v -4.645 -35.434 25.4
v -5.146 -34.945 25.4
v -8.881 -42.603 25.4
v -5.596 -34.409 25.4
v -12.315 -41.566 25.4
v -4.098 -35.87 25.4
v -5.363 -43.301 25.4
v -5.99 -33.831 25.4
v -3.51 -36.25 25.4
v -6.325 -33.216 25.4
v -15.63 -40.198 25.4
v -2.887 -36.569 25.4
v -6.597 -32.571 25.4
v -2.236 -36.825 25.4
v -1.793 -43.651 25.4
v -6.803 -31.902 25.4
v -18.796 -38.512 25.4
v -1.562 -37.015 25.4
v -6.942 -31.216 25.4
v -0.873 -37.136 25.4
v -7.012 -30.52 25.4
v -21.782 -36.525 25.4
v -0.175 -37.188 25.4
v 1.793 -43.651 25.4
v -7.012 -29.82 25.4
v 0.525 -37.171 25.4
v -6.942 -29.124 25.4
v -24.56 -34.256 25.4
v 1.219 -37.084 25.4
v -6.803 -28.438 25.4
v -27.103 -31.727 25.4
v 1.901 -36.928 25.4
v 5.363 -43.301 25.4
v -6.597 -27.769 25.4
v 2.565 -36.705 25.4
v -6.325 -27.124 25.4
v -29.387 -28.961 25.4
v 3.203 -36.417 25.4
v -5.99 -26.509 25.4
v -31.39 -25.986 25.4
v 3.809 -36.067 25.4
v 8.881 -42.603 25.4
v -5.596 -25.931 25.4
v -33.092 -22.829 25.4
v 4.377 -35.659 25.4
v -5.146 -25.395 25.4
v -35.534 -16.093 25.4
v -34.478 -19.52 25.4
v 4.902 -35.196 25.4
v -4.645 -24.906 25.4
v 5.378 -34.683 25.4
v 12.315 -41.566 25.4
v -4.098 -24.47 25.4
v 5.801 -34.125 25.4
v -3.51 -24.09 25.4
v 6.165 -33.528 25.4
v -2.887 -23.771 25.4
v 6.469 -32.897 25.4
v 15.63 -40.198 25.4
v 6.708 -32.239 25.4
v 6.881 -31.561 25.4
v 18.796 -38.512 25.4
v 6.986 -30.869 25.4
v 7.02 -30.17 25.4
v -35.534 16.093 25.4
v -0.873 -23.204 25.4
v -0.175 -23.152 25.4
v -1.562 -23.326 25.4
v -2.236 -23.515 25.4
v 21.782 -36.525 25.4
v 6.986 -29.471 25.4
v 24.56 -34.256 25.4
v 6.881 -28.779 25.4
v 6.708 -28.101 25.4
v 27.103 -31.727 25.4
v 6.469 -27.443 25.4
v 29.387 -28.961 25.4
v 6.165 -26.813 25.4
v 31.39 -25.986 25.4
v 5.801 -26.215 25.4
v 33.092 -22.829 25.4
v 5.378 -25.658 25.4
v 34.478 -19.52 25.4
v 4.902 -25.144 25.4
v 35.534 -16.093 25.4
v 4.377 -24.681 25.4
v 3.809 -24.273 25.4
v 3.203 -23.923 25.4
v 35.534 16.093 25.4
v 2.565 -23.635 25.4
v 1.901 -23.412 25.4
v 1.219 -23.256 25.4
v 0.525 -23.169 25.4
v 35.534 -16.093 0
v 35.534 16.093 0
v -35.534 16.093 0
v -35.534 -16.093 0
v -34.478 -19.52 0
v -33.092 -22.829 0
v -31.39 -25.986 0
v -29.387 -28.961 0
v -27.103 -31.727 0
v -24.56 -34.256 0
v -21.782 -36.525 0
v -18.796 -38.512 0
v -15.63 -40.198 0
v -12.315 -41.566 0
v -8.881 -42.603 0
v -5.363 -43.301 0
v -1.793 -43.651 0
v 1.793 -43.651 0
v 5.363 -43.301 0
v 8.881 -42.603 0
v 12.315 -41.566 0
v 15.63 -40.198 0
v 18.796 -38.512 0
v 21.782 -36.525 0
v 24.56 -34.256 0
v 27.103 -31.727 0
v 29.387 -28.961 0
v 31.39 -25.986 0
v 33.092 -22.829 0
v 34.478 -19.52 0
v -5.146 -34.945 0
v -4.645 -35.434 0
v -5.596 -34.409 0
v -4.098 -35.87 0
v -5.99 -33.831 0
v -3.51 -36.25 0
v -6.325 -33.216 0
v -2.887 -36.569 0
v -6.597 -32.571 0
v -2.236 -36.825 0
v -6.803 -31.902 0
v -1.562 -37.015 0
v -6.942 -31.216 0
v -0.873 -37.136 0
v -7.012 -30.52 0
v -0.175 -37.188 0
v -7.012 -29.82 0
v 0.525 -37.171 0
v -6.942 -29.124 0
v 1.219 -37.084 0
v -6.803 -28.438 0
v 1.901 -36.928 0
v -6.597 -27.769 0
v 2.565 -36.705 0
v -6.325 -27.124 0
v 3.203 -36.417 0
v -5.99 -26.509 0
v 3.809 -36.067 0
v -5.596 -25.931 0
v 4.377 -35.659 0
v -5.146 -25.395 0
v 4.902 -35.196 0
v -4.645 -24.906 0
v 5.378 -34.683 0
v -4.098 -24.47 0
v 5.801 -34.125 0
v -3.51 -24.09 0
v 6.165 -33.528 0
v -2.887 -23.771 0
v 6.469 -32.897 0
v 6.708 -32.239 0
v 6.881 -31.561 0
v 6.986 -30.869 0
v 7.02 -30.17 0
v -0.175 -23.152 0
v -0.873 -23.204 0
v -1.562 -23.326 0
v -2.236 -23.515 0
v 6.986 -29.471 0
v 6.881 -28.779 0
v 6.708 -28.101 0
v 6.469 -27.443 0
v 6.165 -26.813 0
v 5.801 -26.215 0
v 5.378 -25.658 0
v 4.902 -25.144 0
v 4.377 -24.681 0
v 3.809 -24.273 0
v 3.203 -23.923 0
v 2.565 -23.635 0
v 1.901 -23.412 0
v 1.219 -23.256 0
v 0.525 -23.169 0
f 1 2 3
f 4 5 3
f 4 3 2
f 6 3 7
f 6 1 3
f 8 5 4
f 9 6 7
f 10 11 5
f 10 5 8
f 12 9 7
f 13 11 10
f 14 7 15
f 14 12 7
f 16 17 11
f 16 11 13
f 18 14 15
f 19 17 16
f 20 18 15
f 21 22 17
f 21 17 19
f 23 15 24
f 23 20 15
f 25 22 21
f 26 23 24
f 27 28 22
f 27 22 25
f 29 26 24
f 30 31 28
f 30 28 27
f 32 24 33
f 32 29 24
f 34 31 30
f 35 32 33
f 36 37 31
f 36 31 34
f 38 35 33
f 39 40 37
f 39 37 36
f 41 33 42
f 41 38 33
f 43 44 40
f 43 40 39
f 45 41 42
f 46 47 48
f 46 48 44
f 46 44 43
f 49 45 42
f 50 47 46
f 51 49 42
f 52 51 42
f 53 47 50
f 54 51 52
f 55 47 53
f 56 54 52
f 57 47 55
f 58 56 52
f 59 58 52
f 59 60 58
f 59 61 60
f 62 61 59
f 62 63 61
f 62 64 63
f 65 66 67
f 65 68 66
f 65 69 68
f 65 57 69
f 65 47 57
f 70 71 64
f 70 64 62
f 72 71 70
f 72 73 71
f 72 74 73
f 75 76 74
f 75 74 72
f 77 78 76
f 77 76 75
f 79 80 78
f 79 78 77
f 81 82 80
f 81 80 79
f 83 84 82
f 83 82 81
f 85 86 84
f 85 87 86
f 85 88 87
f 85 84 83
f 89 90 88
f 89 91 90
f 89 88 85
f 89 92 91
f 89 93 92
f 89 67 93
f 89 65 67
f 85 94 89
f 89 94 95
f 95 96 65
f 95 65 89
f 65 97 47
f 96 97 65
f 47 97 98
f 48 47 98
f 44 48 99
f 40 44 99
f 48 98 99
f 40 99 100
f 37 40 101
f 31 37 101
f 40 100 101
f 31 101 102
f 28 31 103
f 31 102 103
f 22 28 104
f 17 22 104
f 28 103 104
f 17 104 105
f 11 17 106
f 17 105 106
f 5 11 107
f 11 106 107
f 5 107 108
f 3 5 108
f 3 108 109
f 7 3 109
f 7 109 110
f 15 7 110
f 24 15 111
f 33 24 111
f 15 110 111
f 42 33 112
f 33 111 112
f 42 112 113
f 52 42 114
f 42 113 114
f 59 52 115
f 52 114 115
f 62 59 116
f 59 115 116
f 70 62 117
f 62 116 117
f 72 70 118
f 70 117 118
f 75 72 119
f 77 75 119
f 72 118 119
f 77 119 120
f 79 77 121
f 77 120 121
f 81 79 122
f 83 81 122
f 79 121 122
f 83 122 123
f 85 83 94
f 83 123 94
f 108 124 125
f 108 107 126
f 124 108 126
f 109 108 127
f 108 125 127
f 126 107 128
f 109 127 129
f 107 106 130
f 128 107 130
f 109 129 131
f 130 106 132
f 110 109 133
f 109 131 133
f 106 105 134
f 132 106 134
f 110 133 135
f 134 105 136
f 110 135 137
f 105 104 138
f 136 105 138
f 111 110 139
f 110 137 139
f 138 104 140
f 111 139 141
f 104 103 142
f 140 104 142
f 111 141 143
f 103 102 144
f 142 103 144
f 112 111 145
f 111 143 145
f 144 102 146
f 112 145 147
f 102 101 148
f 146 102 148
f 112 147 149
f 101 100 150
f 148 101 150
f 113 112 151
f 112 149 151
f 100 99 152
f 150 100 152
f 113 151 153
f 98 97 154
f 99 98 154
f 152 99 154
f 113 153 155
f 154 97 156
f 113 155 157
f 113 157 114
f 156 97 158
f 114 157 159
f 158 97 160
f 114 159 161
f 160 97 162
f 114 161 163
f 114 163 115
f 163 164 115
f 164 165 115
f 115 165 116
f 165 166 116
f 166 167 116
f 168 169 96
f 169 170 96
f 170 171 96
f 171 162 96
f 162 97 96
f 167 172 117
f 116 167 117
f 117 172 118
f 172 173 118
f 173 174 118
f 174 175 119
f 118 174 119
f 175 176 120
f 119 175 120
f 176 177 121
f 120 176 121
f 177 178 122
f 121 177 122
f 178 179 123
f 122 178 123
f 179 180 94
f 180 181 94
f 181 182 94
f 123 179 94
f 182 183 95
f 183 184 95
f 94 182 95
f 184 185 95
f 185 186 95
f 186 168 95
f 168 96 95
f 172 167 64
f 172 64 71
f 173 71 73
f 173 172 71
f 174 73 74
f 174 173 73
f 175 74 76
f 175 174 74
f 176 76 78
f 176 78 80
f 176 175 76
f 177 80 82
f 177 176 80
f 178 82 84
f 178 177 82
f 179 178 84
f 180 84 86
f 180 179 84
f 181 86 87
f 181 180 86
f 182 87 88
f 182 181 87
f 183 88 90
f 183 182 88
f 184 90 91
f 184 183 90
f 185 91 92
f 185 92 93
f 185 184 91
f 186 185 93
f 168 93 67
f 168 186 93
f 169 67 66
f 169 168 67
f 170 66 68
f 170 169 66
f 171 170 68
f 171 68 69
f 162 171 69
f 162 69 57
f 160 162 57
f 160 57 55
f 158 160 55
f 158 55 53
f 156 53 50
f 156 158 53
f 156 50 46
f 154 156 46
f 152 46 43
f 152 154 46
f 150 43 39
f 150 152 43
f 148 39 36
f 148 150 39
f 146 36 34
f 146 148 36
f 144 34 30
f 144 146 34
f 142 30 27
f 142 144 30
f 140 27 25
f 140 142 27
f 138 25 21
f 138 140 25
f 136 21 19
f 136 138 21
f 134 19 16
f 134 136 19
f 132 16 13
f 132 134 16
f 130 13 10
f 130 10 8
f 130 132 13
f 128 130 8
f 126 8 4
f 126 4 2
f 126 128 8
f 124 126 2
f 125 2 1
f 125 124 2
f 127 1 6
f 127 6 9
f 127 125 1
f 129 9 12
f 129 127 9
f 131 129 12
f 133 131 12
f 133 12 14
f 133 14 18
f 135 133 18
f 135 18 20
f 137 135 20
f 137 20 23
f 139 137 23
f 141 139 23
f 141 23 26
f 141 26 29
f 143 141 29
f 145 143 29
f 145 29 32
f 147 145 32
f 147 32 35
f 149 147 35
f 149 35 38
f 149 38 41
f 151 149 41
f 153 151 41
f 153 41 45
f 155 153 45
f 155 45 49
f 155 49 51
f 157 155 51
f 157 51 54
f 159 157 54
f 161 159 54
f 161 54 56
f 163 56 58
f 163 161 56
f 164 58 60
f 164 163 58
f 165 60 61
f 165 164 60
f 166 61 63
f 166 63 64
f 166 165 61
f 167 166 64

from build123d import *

# Parameters (mm, degrees)
F0_W     = 71.067976
F0_H     = 32.185238
F0_R     = 7.020388
F1_DEPTH = 25.4


with BuildPart() as f1:
    # F0 (on Top) → F1 (new body)
    with BuildSketch(Plane.XY):
        Rectangle(F0_W, F0_H)
        with BuildLine():
            ThreePointArc((-35.533988, -16.092619), (0, -43.695065), (35.533988, -16.092619))
            Line((35.533988, -16.092619), (-35.533988, -16.092619))
        make_face()
        with Locations((0, -30.170137)):
            Circle(F0_R, mode=Mode.SUBTRACT)
    extrude(amount=F1_DEPTH)


solid = f1.part
